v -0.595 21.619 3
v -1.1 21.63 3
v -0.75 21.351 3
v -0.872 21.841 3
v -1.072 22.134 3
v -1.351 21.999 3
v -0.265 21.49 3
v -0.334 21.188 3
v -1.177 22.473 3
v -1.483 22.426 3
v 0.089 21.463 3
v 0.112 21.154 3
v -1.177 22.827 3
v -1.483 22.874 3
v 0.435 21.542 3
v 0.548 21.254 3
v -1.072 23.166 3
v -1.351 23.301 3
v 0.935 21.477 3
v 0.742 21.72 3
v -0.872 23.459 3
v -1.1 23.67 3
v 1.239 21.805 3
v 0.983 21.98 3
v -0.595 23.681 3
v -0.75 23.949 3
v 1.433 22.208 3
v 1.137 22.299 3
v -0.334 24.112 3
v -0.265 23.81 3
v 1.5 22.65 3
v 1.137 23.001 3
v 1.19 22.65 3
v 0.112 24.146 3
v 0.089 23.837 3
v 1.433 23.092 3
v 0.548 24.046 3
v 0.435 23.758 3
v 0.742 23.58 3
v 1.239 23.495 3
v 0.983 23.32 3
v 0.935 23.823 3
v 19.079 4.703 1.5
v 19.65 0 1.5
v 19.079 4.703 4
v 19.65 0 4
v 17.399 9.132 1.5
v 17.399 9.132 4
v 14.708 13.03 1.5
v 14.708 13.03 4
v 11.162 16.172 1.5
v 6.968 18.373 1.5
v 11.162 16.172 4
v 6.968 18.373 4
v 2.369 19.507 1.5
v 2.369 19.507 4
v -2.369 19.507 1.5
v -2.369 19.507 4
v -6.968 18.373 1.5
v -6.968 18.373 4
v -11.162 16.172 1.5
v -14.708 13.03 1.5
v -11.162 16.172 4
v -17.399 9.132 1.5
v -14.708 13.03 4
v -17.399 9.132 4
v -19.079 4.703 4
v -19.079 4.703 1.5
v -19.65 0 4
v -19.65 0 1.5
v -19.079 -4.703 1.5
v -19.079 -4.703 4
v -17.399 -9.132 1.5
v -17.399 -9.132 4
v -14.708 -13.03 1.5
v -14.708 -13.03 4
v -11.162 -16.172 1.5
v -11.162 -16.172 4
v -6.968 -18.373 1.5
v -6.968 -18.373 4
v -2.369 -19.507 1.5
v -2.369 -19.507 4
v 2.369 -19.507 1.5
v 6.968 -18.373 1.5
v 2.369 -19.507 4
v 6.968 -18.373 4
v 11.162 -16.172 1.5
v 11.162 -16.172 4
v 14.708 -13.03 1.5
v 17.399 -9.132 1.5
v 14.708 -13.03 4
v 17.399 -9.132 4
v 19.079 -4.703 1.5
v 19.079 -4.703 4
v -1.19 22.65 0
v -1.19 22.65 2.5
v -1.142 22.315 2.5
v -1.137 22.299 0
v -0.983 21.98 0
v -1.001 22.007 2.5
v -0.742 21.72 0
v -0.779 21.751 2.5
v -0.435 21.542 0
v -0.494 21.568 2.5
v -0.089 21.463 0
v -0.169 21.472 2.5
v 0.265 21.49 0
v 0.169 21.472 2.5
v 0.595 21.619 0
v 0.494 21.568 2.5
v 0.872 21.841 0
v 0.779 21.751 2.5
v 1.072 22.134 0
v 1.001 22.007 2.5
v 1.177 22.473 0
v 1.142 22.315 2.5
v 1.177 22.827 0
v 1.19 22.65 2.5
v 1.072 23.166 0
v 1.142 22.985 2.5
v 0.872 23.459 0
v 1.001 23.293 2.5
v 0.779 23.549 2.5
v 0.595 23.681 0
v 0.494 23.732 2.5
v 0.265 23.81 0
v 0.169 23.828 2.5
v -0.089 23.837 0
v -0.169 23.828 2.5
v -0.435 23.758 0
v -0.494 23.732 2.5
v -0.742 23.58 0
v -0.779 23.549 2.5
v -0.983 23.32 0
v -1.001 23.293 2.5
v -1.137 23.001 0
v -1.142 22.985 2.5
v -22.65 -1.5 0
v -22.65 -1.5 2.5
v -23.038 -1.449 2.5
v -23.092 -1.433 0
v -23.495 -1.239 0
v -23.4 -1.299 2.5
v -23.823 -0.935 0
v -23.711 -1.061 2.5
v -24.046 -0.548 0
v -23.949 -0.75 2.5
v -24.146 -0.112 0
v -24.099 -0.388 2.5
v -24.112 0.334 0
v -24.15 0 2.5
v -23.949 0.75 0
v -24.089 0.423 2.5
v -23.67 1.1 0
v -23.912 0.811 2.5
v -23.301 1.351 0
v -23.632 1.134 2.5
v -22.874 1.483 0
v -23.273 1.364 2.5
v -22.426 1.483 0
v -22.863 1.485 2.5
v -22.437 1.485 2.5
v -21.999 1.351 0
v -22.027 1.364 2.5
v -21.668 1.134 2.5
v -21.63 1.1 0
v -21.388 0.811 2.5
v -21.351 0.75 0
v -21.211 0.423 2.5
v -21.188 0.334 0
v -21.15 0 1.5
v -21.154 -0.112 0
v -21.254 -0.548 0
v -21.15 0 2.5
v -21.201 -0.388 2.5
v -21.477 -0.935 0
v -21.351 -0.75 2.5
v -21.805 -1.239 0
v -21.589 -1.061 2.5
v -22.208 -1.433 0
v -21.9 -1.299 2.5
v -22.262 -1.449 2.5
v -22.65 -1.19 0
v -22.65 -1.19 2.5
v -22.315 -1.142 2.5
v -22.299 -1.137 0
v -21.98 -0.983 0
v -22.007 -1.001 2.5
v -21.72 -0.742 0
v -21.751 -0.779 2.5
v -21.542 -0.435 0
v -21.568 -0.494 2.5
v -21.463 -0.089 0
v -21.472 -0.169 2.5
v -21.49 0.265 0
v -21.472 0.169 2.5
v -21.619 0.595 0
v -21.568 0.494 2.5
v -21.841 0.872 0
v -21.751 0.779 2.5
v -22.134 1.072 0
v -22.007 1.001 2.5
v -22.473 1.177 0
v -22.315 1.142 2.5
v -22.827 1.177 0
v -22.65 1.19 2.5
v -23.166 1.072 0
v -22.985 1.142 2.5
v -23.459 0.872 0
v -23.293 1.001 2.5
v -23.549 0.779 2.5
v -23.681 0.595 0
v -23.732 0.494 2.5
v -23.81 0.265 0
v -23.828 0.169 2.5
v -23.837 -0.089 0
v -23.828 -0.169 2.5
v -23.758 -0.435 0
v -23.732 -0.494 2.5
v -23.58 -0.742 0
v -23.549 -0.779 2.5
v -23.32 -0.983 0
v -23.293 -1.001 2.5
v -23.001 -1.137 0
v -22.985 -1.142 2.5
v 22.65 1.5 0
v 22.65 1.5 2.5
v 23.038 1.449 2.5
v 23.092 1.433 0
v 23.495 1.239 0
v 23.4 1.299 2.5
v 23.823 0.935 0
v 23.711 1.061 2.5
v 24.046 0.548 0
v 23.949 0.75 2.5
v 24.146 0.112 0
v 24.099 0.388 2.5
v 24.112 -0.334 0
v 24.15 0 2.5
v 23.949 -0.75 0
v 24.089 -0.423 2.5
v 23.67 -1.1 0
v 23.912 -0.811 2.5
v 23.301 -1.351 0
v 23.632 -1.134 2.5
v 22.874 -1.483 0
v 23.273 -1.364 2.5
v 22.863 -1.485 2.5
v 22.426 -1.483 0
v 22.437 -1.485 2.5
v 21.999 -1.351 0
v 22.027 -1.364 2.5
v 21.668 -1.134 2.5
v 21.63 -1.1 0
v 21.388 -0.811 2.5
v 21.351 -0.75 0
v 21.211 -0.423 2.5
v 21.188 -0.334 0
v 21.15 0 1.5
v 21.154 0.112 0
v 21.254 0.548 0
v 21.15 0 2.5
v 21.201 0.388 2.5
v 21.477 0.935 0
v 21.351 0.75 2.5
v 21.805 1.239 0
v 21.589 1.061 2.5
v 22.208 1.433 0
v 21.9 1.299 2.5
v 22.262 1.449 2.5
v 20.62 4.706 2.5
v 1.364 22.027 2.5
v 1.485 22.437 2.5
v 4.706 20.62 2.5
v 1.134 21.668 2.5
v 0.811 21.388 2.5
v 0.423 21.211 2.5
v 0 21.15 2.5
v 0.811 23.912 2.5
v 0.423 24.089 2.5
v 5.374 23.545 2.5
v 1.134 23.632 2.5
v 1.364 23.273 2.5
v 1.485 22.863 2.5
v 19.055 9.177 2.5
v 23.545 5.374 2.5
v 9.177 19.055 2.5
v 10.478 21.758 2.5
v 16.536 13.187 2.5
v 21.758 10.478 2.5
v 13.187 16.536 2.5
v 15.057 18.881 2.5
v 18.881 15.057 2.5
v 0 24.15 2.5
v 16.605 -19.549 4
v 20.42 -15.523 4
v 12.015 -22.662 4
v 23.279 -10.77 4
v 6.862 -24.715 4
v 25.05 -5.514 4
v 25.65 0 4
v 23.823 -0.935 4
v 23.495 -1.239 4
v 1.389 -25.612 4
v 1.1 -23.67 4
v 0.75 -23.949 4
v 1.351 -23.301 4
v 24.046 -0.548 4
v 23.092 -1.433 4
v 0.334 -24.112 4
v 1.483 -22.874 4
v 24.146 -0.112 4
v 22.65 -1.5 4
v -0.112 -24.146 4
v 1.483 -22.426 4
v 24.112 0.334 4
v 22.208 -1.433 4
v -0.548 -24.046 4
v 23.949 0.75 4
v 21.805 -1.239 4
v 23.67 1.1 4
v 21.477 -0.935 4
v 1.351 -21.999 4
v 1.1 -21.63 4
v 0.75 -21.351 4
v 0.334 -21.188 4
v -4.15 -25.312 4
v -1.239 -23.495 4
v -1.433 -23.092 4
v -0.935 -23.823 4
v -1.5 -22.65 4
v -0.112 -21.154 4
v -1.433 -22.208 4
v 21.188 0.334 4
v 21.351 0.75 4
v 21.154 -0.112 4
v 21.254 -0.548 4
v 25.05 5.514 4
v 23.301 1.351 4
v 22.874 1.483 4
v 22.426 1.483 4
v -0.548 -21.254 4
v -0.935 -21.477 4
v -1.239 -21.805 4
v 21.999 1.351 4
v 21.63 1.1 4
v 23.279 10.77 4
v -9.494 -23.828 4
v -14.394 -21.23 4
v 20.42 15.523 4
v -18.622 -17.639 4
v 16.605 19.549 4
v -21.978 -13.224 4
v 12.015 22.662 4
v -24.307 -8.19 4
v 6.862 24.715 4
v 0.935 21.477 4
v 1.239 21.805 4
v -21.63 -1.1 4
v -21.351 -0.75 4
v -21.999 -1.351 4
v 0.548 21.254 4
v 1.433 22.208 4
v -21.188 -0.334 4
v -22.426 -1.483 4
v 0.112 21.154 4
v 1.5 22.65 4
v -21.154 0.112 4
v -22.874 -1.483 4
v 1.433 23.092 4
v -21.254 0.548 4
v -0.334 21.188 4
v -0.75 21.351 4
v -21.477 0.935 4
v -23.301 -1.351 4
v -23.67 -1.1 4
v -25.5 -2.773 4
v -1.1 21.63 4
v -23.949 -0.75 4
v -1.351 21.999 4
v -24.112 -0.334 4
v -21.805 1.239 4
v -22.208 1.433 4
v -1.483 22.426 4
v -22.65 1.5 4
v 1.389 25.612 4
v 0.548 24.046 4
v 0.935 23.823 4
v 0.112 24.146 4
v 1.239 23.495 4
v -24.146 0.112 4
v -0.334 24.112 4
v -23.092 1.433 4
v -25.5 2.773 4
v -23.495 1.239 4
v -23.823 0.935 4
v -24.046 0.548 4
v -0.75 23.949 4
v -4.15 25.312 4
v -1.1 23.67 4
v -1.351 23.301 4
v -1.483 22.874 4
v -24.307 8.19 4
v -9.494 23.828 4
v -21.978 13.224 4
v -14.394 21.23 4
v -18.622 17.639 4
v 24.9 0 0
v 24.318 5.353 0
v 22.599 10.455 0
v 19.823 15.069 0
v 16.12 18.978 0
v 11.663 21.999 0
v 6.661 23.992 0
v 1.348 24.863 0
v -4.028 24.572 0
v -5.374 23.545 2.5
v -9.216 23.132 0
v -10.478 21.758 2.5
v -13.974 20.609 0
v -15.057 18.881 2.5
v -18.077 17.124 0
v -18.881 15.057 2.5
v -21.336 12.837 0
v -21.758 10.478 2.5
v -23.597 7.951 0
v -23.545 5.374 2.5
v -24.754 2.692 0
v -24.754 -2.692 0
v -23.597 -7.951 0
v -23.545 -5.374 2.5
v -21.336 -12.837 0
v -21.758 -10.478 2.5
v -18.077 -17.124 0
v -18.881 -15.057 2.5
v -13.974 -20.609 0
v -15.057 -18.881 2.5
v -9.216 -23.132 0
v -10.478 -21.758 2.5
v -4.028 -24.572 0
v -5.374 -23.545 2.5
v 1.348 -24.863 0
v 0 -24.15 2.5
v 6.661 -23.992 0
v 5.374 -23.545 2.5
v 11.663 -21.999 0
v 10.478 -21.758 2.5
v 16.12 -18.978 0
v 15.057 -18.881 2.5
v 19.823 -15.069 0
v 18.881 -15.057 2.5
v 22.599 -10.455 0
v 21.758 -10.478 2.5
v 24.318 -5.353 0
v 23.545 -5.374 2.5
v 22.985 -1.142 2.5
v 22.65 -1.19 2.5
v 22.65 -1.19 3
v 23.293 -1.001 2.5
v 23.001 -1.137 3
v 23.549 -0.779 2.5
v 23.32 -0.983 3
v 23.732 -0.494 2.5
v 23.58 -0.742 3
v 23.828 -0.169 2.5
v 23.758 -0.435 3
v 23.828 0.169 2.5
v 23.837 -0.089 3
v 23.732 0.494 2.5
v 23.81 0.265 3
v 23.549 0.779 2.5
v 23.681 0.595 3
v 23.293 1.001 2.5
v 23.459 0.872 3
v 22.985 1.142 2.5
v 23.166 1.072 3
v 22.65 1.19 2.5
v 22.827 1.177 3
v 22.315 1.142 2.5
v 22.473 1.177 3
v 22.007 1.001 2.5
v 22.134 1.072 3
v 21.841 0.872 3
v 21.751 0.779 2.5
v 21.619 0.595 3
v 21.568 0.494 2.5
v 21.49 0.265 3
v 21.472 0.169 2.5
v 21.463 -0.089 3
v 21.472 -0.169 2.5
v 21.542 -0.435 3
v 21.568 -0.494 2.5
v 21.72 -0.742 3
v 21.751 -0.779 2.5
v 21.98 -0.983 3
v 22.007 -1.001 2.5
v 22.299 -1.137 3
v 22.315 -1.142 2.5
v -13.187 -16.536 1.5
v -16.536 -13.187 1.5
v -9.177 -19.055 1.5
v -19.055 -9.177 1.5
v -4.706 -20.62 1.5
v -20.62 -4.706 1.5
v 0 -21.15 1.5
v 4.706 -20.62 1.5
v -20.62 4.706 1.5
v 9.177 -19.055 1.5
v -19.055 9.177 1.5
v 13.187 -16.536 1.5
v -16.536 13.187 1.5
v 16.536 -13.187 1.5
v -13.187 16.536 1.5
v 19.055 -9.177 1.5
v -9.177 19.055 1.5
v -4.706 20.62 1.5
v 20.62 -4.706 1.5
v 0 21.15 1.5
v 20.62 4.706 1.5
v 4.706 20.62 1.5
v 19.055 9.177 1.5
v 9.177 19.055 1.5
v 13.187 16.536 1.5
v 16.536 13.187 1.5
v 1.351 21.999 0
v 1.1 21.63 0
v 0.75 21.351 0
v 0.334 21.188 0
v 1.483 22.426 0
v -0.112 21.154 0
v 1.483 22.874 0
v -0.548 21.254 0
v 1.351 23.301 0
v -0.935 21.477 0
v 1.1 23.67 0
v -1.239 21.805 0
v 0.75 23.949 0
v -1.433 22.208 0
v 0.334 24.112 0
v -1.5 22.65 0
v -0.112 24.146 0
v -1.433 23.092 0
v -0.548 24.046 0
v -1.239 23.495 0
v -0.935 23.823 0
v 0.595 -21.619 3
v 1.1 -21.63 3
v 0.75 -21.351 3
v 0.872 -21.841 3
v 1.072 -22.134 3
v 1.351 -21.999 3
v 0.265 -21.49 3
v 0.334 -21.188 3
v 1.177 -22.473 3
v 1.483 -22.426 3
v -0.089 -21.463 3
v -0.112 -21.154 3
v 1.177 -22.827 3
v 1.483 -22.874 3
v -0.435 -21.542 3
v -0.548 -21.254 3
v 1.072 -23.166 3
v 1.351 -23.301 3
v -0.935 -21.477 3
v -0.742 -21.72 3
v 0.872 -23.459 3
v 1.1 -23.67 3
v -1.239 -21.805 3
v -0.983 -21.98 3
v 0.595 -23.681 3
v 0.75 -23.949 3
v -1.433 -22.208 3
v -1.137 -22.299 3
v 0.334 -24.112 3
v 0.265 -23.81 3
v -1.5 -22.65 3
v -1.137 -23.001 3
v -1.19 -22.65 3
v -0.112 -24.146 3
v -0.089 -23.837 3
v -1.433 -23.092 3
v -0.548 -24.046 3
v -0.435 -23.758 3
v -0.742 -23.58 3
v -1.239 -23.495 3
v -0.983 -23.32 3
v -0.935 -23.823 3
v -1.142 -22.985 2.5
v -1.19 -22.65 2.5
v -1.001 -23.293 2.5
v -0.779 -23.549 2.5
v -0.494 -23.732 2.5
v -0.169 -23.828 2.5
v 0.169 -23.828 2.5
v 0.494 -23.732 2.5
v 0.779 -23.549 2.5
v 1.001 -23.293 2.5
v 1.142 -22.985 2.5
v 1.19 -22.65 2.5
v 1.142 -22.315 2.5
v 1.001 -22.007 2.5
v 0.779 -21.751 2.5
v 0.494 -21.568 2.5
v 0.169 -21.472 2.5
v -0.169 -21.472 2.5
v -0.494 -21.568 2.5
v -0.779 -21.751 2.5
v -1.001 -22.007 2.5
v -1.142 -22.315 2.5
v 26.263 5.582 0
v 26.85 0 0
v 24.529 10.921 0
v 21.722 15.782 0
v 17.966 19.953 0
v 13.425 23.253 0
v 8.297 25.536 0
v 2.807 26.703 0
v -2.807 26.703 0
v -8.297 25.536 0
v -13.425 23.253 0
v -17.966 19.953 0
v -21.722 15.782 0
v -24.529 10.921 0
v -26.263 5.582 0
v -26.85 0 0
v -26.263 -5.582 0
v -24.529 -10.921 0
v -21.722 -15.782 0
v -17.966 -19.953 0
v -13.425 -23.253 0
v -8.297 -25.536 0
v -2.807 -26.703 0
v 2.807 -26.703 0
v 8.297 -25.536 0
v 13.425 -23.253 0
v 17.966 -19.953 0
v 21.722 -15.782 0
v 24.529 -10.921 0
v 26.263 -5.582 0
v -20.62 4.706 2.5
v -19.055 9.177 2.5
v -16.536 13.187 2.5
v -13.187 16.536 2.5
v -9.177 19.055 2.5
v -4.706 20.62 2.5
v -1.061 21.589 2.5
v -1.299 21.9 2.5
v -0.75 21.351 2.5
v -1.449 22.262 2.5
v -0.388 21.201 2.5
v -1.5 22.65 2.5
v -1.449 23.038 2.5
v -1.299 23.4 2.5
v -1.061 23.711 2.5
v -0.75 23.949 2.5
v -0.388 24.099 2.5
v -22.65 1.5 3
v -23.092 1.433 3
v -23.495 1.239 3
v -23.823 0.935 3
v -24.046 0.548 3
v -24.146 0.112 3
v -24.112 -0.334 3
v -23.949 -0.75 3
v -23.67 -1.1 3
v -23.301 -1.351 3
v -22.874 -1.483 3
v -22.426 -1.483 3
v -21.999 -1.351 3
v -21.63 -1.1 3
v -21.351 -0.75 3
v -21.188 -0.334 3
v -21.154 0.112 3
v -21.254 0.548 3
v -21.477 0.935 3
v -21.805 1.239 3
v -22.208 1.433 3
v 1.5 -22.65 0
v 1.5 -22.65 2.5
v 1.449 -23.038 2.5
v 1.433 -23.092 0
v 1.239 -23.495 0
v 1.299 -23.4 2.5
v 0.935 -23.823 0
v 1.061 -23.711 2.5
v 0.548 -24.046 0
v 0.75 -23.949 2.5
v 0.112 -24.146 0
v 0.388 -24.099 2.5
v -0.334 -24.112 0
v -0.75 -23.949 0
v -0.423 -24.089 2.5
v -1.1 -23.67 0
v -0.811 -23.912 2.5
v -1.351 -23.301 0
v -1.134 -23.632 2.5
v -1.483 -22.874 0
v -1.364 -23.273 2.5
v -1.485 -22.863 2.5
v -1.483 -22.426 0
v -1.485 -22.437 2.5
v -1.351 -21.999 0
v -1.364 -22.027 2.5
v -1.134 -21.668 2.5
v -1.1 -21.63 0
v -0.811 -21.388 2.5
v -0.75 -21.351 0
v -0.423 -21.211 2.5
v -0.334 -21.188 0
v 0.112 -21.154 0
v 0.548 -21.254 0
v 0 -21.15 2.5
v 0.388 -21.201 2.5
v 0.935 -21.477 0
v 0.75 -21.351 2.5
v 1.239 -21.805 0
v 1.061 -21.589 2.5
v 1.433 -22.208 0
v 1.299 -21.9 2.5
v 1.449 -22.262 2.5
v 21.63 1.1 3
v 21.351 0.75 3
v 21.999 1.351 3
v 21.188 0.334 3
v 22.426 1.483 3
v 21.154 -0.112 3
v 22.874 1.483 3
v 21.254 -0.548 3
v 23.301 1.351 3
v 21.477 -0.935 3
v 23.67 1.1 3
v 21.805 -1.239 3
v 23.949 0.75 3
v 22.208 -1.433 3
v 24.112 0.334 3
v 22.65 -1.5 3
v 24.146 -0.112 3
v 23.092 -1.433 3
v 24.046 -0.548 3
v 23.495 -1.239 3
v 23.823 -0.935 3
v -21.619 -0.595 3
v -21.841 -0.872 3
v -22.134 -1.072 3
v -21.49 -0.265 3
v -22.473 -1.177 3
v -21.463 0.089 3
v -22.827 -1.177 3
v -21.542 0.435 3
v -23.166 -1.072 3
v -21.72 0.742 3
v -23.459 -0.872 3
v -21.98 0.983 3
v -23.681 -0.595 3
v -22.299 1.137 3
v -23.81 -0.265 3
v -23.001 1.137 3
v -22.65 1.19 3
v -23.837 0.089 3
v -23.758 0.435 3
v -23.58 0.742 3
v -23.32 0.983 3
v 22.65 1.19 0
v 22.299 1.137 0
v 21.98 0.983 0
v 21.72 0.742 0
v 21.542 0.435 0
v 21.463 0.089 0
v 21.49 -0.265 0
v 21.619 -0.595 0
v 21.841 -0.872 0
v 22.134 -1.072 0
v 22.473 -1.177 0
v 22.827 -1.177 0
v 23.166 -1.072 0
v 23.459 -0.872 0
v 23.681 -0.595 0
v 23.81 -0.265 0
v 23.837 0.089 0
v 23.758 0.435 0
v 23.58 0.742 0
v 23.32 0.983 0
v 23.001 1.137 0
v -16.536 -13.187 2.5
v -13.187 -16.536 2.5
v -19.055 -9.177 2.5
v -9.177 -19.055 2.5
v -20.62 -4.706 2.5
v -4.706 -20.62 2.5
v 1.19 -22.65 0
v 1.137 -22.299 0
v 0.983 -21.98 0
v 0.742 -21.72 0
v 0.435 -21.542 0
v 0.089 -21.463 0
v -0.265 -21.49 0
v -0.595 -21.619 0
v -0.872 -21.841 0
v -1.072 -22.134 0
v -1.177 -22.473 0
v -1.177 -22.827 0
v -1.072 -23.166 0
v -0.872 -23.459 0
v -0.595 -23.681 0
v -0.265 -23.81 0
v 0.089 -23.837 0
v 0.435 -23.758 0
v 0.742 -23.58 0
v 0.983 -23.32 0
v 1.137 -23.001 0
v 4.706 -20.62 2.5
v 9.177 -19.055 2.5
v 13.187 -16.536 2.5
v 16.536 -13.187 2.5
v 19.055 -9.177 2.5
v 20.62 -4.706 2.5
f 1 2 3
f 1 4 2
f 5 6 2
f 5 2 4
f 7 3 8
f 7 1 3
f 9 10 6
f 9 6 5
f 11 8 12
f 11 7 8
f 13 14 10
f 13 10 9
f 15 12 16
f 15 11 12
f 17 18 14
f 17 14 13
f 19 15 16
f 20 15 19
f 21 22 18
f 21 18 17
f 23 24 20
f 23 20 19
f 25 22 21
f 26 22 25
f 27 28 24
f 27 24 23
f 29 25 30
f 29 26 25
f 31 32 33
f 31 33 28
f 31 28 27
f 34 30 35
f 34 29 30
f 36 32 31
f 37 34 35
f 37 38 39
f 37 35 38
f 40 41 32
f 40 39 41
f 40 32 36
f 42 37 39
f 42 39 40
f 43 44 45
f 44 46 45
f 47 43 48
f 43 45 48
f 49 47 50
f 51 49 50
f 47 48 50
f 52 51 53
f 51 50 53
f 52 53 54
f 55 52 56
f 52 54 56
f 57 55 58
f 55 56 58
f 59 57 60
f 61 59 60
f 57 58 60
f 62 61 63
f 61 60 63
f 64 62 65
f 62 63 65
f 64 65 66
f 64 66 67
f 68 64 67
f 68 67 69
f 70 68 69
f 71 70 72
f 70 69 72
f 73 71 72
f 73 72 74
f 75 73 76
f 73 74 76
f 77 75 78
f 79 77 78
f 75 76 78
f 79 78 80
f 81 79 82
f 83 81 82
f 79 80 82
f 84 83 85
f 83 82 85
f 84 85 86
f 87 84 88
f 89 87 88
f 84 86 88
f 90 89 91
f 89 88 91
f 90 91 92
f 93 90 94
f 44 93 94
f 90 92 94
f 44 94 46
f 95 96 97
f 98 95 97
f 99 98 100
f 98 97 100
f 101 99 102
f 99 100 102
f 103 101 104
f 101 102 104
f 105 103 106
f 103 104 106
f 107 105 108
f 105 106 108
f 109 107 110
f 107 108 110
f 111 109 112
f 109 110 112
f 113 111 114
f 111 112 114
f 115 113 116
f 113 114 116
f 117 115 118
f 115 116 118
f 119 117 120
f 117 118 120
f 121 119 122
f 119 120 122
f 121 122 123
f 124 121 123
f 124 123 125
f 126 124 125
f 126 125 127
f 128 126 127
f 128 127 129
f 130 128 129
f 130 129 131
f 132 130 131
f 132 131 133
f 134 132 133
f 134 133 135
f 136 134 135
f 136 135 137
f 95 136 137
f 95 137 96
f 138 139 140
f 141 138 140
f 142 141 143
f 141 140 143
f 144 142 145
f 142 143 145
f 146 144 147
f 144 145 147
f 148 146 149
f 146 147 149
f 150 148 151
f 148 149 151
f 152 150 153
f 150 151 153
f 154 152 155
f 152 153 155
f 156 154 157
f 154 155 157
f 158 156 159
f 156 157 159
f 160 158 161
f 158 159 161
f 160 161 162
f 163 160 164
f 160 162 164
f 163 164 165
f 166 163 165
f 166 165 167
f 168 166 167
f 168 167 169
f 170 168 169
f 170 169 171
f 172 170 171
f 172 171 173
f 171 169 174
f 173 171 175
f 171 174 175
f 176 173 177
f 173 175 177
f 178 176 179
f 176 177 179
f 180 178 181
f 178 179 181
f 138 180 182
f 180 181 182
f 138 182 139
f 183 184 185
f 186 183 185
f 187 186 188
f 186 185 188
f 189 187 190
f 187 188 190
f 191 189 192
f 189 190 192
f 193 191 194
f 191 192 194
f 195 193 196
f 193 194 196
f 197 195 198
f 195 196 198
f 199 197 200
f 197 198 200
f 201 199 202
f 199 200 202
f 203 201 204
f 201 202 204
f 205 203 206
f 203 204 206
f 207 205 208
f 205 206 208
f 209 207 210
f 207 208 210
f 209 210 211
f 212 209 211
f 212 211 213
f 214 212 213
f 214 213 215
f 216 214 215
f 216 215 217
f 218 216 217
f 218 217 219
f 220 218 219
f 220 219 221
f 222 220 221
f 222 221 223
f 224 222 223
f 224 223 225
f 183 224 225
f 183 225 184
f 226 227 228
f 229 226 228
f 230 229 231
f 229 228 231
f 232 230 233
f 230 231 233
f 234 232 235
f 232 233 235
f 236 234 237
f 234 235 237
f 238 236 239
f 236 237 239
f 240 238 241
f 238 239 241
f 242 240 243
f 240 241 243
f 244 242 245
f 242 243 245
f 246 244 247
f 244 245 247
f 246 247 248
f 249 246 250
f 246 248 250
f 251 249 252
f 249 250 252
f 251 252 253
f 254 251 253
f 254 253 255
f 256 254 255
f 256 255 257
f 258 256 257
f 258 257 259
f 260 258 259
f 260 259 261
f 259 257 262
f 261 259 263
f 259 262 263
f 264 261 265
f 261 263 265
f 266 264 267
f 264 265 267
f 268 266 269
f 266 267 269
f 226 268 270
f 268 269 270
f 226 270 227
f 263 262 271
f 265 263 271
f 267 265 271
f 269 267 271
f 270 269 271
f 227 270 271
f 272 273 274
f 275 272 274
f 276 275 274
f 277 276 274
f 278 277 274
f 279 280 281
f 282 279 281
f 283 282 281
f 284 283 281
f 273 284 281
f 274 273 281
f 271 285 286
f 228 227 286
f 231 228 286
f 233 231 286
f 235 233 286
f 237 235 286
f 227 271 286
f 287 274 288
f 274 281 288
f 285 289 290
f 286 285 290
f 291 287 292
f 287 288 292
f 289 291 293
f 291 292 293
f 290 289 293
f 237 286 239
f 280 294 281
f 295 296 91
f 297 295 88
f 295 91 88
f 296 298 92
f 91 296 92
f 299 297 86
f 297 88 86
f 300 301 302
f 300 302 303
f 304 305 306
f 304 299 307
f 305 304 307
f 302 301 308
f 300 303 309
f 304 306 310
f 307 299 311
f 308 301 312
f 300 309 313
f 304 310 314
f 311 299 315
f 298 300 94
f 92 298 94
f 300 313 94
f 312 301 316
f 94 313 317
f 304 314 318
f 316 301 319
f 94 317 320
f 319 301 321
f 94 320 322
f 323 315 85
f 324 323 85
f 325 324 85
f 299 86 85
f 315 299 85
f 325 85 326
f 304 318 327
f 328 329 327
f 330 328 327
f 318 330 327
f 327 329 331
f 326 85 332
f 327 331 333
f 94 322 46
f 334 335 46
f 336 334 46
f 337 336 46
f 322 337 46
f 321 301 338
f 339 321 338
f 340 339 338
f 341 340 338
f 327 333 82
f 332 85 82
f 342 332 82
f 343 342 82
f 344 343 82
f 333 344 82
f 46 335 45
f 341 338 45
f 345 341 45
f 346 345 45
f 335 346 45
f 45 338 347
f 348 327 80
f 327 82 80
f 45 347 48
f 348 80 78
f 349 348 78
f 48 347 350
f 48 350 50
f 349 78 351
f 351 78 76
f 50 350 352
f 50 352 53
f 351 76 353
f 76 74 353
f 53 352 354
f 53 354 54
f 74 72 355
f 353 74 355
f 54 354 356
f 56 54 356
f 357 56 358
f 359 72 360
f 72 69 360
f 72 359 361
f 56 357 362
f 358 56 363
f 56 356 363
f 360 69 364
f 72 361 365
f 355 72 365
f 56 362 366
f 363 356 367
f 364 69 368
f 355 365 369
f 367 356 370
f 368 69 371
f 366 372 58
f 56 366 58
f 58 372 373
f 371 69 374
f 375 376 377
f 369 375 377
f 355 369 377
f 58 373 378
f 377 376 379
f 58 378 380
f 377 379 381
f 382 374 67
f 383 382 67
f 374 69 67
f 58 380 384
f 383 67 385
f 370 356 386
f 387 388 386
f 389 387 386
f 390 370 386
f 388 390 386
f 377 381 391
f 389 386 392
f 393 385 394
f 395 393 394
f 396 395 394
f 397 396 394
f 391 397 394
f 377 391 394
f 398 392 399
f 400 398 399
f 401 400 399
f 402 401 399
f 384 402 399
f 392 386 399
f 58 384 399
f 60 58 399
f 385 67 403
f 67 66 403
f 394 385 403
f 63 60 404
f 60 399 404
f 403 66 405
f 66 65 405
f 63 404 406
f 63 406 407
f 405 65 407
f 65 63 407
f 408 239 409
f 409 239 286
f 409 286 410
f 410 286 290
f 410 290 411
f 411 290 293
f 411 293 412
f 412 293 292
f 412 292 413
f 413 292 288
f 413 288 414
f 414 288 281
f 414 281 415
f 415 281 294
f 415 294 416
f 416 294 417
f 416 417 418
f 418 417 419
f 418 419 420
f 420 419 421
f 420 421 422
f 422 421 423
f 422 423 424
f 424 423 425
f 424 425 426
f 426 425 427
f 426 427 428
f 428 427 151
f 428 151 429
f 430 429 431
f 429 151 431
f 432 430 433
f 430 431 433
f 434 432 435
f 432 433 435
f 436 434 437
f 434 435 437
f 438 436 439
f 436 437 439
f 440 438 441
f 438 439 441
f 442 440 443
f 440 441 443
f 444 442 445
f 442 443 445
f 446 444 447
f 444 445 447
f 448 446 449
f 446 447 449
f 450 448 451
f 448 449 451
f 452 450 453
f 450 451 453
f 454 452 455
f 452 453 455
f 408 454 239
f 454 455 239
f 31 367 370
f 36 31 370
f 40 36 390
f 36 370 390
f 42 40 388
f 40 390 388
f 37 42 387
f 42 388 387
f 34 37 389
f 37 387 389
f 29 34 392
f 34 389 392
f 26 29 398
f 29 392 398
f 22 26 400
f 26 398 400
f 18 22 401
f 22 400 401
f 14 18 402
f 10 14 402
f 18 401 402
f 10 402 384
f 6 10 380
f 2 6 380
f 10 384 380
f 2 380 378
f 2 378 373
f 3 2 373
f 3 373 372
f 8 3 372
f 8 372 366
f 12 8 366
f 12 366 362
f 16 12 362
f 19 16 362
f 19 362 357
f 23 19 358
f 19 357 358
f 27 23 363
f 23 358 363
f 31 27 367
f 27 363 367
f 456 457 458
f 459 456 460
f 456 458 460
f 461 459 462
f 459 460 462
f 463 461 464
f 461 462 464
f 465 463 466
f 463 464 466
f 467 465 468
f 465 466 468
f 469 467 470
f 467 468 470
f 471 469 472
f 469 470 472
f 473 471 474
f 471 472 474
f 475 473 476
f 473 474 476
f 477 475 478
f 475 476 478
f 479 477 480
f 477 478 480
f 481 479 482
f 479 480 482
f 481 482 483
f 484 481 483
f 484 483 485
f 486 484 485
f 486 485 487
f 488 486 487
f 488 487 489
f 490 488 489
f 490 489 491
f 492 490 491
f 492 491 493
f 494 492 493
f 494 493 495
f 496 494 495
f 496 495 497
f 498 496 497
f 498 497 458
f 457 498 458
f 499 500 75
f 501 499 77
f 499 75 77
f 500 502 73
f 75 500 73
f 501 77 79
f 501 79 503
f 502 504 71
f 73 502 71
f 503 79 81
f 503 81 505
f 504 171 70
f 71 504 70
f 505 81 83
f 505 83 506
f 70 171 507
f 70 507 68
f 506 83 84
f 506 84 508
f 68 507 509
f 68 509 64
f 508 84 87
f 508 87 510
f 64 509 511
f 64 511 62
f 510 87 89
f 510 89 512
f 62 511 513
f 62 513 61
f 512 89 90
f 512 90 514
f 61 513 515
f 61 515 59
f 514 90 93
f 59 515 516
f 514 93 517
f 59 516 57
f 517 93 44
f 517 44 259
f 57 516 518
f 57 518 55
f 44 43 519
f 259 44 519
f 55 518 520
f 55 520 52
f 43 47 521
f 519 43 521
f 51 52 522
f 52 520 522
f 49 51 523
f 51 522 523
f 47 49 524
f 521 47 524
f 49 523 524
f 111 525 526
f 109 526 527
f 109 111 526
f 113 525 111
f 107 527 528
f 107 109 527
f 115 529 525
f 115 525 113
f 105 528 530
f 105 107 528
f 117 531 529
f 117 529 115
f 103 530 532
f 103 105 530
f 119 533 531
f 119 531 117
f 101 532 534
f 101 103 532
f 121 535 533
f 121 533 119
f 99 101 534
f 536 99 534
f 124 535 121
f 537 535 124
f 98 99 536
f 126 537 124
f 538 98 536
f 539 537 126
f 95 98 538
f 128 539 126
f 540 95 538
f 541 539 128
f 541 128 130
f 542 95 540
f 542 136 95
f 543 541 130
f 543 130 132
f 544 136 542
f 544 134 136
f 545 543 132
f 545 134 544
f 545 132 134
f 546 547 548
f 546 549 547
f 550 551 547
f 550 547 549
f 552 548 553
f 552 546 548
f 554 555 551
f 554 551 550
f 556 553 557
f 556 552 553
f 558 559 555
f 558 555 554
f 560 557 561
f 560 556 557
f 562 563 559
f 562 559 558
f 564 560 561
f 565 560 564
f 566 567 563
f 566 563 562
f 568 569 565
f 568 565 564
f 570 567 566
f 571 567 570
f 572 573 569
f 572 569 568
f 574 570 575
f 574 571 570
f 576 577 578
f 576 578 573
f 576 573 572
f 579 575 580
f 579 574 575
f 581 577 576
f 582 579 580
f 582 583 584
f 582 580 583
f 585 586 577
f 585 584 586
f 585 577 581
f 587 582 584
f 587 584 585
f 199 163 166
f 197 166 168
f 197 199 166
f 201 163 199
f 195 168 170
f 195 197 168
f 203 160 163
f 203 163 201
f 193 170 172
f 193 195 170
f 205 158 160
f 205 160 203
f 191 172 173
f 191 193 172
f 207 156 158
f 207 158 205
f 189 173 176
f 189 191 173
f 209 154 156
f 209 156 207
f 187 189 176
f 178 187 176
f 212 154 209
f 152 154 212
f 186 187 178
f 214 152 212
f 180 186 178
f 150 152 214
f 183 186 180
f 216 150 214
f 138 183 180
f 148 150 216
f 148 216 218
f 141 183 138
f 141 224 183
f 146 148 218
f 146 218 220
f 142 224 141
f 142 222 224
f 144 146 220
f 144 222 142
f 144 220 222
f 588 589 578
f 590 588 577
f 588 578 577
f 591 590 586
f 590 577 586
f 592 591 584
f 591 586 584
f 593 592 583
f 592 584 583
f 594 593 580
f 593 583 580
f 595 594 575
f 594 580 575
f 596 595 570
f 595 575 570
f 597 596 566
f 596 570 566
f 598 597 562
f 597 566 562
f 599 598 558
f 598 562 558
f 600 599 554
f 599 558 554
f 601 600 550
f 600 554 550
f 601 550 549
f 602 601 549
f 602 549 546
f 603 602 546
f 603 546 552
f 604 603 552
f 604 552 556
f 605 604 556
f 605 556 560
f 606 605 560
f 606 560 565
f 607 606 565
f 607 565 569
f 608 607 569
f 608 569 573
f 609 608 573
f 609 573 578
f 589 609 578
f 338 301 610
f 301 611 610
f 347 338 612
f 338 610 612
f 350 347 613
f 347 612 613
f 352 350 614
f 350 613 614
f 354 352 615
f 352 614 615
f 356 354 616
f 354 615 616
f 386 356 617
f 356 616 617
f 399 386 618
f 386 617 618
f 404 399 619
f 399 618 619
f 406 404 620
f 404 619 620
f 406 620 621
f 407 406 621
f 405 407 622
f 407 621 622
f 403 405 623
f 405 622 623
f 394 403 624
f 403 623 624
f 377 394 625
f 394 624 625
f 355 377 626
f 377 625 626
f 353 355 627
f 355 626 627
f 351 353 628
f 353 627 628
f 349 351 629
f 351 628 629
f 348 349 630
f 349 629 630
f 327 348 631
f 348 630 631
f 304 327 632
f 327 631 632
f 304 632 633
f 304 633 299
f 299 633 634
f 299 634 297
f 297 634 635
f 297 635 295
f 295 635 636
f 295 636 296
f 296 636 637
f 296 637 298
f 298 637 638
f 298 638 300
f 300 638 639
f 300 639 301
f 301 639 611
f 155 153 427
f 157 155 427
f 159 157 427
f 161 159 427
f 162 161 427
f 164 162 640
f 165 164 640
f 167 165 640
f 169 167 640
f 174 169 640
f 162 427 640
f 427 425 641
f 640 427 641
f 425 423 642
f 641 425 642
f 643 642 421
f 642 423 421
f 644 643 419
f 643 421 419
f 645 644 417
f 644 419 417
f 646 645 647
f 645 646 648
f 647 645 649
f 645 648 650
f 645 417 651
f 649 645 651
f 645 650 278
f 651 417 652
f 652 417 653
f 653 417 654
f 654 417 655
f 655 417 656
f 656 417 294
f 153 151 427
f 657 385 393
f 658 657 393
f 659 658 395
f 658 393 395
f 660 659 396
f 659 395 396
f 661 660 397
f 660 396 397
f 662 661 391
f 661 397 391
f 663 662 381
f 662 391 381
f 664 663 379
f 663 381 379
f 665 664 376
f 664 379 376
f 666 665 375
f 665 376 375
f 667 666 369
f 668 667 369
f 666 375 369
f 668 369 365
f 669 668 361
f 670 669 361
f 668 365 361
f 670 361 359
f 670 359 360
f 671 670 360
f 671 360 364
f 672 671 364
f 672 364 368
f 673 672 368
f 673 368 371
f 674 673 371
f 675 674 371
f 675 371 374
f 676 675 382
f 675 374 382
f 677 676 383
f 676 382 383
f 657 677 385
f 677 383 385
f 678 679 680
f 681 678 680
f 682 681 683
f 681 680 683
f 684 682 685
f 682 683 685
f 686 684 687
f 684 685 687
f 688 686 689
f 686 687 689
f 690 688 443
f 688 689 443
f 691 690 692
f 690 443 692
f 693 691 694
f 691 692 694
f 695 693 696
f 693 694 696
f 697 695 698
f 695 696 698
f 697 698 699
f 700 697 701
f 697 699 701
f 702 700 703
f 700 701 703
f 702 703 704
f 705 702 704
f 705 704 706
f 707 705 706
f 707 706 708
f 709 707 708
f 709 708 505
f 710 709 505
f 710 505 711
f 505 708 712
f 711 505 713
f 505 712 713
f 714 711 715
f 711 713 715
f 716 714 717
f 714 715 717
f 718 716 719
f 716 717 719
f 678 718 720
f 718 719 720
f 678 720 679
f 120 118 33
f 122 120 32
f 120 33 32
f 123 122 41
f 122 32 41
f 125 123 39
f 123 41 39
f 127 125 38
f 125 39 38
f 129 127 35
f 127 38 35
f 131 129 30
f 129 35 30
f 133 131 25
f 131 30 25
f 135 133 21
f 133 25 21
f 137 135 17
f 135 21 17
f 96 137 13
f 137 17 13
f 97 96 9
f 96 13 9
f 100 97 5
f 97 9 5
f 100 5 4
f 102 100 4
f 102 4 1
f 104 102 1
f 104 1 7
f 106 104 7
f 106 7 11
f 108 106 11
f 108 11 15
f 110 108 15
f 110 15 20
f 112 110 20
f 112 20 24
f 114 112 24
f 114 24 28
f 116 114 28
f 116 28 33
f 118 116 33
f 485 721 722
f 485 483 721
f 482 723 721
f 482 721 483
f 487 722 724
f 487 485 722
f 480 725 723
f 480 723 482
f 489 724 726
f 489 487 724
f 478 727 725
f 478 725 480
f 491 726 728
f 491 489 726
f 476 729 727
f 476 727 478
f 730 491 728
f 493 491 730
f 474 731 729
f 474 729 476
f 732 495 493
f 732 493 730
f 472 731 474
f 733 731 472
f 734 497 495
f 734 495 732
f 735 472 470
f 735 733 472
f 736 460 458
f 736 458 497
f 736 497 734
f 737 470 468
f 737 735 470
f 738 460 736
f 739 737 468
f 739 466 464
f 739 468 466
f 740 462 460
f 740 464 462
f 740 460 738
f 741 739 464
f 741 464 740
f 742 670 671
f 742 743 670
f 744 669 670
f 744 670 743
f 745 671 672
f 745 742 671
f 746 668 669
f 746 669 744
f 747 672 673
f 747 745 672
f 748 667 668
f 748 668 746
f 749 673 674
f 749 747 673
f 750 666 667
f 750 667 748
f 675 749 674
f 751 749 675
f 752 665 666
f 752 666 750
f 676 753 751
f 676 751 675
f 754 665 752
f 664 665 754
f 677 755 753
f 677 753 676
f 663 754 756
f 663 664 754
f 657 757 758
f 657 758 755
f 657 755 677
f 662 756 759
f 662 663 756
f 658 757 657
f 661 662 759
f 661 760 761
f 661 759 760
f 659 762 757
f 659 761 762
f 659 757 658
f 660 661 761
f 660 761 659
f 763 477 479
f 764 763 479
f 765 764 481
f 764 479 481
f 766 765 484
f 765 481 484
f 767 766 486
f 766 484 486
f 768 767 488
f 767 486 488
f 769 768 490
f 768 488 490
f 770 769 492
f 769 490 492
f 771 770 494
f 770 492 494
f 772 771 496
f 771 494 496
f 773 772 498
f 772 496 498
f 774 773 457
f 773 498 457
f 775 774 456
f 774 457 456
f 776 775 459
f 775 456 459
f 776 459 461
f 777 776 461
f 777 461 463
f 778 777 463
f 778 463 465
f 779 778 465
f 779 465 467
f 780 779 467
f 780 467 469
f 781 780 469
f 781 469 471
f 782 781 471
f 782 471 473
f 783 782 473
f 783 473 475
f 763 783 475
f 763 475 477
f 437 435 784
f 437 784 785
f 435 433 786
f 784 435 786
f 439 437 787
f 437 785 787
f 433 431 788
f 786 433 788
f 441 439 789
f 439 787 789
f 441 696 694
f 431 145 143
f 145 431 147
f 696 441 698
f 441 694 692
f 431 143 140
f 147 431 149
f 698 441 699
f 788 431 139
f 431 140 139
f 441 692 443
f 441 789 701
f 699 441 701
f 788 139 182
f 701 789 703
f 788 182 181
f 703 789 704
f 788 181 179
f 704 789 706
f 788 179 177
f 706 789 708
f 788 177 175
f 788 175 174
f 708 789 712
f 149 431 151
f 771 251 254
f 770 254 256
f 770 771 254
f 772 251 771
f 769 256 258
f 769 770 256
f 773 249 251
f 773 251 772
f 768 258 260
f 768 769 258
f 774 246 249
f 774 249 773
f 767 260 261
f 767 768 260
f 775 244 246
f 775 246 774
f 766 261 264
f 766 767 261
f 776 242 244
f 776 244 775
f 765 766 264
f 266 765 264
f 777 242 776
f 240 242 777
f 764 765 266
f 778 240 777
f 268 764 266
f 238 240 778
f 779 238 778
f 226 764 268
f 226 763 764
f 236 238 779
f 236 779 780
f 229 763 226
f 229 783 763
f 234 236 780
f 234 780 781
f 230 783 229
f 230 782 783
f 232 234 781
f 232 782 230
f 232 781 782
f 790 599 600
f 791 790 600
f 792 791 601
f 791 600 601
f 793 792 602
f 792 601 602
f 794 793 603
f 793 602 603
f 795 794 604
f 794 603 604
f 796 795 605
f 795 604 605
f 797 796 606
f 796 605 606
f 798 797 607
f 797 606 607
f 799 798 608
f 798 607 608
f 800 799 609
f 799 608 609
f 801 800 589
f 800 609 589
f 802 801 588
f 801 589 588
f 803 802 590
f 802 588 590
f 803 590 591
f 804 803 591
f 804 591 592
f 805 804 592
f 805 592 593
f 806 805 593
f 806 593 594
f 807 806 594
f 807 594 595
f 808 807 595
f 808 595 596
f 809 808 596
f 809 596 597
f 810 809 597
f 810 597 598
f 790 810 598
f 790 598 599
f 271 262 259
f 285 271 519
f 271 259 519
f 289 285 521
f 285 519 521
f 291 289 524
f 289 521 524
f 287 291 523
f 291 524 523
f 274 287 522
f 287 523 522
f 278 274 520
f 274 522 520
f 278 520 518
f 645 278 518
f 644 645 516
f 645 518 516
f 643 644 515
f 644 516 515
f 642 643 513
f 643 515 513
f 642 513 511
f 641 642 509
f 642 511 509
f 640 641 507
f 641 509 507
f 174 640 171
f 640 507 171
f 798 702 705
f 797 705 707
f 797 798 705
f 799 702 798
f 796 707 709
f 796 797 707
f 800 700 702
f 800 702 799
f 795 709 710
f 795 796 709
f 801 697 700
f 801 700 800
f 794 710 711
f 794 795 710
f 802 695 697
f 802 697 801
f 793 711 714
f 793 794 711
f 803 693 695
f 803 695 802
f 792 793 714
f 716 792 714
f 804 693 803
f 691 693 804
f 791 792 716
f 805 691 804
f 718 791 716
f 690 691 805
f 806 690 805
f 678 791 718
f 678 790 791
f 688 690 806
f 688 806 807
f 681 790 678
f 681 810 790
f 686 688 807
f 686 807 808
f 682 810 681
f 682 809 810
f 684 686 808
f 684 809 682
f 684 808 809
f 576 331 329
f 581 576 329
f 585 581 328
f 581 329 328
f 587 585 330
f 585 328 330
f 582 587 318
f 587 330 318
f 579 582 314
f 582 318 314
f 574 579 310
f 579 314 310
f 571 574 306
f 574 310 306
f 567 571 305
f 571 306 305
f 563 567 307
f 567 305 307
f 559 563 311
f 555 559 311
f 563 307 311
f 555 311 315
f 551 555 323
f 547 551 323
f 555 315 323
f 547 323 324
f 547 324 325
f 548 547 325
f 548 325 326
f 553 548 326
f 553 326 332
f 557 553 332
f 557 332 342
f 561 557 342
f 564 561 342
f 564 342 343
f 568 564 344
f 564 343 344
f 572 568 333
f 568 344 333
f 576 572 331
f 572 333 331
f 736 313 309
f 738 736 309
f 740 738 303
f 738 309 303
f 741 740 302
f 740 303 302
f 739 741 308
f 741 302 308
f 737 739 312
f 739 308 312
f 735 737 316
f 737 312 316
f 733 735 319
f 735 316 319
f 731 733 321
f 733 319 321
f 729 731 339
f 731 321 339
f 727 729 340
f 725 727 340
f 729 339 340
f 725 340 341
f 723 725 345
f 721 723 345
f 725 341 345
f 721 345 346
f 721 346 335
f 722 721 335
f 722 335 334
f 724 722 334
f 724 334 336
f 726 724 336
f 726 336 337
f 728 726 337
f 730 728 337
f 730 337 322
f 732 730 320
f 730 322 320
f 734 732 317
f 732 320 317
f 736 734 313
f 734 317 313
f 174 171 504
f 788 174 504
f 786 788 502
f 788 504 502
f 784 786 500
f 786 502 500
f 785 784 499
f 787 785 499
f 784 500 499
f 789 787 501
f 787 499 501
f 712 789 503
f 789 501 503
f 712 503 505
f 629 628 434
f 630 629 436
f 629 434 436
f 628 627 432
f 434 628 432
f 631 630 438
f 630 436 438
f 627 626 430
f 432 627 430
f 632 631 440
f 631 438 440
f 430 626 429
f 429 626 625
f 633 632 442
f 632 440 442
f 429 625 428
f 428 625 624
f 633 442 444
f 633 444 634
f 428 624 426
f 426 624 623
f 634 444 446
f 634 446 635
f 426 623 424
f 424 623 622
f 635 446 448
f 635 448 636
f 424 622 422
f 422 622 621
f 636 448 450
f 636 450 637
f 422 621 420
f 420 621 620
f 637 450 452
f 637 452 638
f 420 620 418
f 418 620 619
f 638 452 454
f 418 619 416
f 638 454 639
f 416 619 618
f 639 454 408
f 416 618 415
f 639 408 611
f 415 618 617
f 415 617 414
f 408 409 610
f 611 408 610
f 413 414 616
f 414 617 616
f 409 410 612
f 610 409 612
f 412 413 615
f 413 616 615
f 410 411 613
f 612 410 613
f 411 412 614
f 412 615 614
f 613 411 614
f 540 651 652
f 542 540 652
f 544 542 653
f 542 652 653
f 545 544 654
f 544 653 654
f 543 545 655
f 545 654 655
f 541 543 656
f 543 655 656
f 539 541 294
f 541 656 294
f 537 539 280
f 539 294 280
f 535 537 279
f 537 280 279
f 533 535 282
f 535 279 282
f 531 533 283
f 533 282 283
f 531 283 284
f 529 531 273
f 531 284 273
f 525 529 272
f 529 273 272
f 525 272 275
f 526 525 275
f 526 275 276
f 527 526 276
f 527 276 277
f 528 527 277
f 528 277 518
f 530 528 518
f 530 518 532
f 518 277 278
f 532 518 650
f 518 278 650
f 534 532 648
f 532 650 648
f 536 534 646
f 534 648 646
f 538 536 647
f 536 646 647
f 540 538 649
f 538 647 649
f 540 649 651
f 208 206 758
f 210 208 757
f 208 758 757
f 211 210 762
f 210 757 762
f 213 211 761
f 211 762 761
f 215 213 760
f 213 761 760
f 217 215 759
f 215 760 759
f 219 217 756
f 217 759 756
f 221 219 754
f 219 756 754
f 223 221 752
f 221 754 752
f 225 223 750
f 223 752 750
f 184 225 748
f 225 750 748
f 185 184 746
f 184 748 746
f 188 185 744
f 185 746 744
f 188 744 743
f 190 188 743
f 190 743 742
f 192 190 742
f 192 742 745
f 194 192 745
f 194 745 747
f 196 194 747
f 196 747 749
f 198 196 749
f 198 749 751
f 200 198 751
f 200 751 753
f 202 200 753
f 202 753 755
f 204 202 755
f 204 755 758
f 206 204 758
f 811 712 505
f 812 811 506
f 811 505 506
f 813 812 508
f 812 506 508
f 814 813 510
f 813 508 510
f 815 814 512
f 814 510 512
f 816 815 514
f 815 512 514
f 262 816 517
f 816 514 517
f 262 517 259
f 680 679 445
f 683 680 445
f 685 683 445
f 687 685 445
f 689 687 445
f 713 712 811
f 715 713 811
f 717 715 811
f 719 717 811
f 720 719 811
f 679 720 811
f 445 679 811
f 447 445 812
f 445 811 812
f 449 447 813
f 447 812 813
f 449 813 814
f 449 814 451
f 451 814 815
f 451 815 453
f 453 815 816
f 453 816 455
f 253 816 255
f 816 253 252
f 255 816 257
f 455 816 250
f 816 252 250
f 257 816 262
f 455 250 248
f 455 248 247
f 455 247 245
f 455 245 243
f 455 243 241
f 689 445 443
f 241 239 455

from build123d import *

# Parameters (mm, degrees)
SKETCH001_R              = 1.5
POCKET_DEPTH             = 1
POLARPATTERN_COUNT       = 4
SKETCH002_R              = 1.19
POCKET001_DEPTH          = 155.098074
POLARPATTERN001_COUNT    = 4
SKETCH003_R              = 1.5
PAD_DEPTH                = 2.5
POLARPATTERN002_COUNT    = 4
POLARPATTERN002_FACE38_R = 1.19
POCKET002_DEPTH          = 154.598074
POLARPATTERN003_COUNT    = 4


with BuildPart() as part:
    # Sketch → Revolution (revolve)
    with BuildSketch(Plane.XZ):
        Polygon((19.65, 1.5), (19.65, 4), (25.65, 4), (26.85, 0), (24.9, 0), (24.15, 2.5), (21.15, 2.5), (21.15, 1.5), align=None)
    revolve(axis=Axis((0, 0, 0), (0, 0, 1)))

    # Sketch001 (on Face2 of Revolution) → Pocket (cut)
    with BuildSketch(Plane(origin=(0, 0, 4), x_dir=(-1, 0, 0), z_dir=(0, 0, 1))):
        with Locations((0, 22.65)):
            Circle(SKETCH001_R)
    pocket = extrude(amount=-POCKET_DEPTH, mode=Mode.SUBTRACT)

    # PolarPattern: Pocket ×4 about axis
    polarpattern_axis = Axis((0, 0, 4), (0, 0, 1))
    for i in range(1, POLARPATTERN_COUNT):
        add(pocket.rotate(polarpattern_axis, i * 360 / POLARPATTERN_COUNT), mode=Mode.SUBTRACT)

    # Sketch002 (on Face14 of PolarPattern) → Pocket001 (cut, through all)
    with BuildSketch(Plane(origin=(0, 0, 3), x_dir=(-1, 0, 0), z_dir=(0, 0, 1))):
        with Locations((0, 22.65)):
            Circle(SKETCH002_R)
    pocket001 = extrude(amount=-POCKET001_DEPTH, mode=Mode.SUBTRACT)

    # PolarPattern001: Pocket001 ×4 about axis
    polarpattern001_axis = Axis((0, 0, 3), (0, 0, 1))
    for i in range(1, POLARPATTERN001_COUNT):
        add(pocket001.rotate(polarpattern001_axis, i * 360 / POLARPATTERN001_COUNT), mode=Mode.SUBTRACT)

    # Sketch003 (on Face10 of PolarPattern001) → Pad (join)
    with BuildSketch(Plane(origin=(0, 0, 2.5), x_dir=(1, 0, 0), z_dir=(0, 0, -1))):
        with Locations((0, 22.65)):
            Circle(SKETCH003_R)
    pad = extrude(amount=PAD_DEPTH)

    # PolarPattern002: Pad ×4 about axis
    polarpattern002_axis = Axis((0, 0, 2.5), (0, 0, -1))
    for i in range(1, POLARPATTERN002_COUNT):
        add(pad.rotate(polarpattern002_axis, i * 360 / POLARPATTERN002_COUNT))

    # PolarPattern002 Face38 → Pocket002 (cut, through all)
    with BuildSketch(Plane(origin=(22.65, 0, 2.5), x_dir=(0, 1, 0), z_dir=(0, 0, 1))):
        Circle(POLARPATTERN002_FACE38_R)
    pocket002 = extrude(amount=-POCKET002_DEPTH, mode=Mode.SUBTRACT)

    # PolarPattern003: Pocket002 ×4 about axis
    polarpattern003_axis = Axis((0, 0, 0), (0, 0, 1))
    for i in range(1, POLARPATTERN003_COUNT):
        add(pocket002.rotate(polarpattern003_axis, i * 360 / POLARPATTERN003_COUNT), mode=Mode.SUBTRACT)


solid = part.part
